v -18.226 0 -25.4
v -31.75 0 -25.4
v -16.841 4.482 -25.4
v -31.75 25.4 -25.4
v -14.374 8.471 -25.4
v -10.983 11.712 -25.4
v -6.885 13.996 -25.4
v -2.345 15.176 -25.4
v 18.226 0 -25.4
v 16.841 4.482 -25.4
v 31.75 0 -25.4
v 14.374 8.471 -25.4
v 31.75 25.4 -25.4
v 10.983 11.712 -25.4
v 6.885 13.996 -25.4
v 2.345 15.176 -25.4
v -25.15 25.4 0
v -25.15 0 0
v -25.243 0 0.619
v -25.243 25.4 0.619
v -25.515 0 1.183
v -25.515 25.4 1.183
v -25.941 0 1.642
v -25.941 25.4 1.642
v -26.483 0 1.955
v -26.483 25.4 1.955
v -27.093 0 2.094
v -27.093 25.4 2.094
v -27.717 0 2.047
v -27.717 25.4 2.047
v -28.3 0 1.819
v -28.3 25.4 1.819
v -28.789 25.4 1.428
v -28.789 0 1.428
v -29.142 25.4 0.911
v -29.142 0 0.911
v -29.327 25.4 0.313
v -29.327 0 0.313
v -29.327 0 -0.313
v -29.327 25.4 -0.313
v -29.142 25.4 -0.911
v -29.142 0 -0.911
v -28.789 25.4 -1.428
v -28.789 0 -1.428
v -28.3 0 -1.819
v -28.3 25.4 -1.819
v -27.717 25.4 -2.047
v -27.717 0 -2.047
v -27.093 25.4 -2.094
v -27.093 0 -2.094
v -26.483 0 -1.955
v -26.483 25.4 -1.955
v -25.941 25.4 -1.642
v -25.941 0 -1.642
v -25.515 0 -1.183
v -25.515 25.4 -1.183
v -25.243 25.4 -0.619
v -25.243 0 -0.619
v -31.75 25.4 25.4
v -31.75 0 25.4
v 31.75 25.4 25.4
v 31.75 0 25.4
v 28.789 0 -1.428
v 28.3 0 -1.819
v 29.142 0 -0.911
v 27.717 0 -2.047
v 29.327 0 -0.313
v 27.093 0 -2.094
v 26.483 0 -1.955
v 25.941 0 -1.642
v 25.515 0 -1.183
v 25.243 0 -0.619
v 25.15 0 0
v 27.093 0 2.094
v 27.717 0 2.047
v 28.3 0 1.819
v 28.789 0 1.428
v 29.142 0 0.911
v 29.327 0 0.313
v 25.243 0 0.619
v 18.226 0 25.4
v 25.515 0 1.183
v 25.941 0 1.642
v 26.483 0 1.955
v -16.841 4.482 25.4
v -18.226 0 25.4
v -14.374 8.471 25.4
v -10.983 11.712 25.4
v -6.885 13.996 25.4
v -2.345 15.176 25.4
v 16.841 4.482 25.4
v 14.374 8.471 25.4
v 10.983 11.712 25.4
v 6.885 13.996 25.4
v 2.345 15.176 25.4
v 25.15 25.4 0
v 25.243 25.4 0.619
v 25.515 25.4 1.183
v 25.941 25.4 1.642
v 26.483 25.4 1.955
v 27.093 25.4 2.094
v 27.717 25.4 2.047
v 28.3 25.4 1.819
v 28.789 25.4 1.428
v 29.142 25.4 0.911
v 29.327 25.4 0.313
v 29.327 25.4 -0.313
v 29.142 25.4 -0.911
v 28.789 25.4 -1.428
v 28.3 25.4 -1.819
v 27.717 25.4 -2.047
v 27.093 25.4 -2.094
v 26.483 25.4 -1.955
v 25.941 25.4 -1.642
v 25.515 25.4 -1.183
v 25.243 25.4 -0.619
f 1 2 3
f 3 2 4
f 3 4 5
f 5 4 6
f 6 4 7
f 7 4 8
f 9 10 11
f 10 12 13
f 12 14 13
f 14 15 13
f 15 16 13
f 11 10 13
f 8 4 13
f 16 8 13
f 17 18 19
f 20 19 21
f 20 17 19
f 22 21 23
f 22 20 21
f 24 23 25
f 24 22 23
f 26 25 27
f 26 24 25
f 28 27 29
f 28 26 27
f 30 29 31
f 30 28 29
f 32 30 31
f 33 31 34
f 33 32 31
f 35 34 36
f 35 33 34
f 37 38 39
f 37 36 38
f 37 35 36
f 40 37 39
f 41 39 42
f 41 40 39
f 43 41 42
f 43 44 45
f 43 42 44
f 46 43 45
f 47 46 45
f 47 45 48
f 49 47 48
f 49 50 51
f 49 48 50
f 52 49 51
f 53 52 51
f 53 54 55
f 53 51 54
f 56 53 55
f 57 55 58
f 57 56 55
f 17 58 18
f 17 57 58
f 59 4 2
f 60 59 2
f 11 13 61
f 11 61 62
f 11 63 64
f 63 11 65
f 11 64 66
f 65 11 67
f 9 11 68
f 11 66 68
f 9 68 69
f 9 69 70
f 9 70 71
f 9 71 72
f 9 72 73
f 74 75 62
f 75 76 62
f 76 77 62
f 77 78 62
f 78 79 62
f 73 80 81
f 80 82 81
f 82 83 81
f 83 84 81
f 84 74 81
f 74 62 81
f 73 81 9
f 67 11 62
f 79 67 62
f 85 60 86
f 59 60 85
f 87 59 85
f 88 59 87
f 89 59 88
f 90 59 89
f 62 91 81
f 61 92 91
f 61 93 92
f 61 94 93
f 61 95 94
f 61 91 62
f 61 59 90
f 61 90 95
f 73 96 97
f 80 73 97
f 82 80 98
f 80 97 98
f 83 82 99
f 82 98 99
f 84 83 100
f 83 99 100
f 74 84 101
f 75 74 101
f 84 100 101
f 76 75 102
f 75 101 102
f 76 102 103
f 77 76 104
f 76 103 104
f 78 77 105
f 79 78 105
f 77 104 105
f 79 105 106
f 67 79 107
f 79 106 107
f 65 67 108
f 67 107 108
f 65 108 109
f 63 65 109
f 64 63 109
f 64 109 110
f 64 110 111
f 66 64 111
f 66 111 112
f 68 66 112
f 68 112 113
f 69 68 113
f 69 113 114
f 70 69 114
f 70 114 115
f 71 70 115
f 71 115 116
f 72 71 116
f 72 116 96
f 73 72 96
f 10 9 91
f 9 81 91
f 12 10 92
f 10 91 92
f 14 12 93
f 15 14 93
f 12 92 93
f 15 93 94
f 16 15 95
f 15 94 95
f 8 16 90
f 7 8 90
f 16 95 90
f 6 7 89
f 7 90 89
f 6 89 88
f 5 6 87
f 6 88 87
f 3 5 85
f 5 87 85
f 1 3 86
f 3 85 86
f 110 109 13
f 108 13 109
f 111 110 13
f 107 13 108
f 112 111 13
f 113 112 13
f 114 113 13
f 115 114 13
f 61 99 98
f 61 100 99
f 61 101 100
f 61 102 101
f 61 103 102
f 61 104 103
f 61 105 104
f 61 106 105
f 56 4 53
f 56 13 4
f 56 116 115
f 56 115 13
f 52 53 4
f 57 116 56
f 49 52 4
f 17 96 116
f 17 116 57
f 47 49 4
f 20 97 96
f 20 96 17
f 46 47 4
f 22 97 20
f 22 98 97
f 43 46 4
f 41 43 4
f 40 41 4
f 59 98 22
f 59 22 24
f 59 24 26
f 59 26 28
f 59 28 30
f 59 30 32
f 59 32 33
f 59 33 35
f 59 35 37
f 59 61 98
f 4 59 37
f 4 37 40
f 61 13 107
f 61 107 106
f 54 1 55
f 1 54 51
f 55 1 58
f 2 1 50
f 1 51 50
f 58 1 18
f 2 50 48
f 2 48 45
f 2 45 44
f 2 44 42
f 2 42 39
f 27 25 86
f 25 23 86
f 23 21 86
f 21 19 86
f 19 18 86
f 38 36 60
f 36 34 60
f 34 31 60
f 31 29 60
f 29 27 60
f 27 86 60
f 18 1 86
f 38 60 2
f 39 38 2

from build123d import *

# Parameters (mm, degrees)
PAD001_DEPTH  = 25.4
SKETCH004_R   = 2.1
HOLE001_DEPTH = 195.78938


with BuildPart() as part:
    # CopySketch002 → Pad001 (new body, symmetric)
    with BuildSketch(Plane.XY):
        with BuildLine():
            Line((31.75, 25.4), (-31.75, 25.4))
            Line((-31.75, 25.4), (-31.75, 0))
            Line((-18.225514, 0), (-31.75, 0))
            ThreePointArc((18.225514, 0), (0, 15.325), (-18.225514, 0))
            Line((31.75, 0), (18.225514, 0))
            Line((31.75, 25.4), (31.75, 0))
        make_face()
    extrude(amount=PAD001_DEPTH, both=True)

    # Sketch004 (on Face2 of Pad001) → Hole001 (cut, through all)
    with BuildSketch(Plane(origin=(0, 25.4, 0), x_dir=(-1, 0, 0), z_dir=(0, 1, 0))):
        with Locations((-27.25, 0)):
            Circle(SKETCH004_R)
    hole001 = extrude(amount=-HOLE001_DEPTH, mode=Mode.SUBTRACT)

    # Mirrored002: Hole001 across Sketch004 V_Axis
    add(hole001.mirror(Plane(origin=(0, 25.4, 0), x_dir=(0, 1, 0), z_dir=(-1, 0, 0))), mode=Mode.SUBTRACT)


solid = part.part
